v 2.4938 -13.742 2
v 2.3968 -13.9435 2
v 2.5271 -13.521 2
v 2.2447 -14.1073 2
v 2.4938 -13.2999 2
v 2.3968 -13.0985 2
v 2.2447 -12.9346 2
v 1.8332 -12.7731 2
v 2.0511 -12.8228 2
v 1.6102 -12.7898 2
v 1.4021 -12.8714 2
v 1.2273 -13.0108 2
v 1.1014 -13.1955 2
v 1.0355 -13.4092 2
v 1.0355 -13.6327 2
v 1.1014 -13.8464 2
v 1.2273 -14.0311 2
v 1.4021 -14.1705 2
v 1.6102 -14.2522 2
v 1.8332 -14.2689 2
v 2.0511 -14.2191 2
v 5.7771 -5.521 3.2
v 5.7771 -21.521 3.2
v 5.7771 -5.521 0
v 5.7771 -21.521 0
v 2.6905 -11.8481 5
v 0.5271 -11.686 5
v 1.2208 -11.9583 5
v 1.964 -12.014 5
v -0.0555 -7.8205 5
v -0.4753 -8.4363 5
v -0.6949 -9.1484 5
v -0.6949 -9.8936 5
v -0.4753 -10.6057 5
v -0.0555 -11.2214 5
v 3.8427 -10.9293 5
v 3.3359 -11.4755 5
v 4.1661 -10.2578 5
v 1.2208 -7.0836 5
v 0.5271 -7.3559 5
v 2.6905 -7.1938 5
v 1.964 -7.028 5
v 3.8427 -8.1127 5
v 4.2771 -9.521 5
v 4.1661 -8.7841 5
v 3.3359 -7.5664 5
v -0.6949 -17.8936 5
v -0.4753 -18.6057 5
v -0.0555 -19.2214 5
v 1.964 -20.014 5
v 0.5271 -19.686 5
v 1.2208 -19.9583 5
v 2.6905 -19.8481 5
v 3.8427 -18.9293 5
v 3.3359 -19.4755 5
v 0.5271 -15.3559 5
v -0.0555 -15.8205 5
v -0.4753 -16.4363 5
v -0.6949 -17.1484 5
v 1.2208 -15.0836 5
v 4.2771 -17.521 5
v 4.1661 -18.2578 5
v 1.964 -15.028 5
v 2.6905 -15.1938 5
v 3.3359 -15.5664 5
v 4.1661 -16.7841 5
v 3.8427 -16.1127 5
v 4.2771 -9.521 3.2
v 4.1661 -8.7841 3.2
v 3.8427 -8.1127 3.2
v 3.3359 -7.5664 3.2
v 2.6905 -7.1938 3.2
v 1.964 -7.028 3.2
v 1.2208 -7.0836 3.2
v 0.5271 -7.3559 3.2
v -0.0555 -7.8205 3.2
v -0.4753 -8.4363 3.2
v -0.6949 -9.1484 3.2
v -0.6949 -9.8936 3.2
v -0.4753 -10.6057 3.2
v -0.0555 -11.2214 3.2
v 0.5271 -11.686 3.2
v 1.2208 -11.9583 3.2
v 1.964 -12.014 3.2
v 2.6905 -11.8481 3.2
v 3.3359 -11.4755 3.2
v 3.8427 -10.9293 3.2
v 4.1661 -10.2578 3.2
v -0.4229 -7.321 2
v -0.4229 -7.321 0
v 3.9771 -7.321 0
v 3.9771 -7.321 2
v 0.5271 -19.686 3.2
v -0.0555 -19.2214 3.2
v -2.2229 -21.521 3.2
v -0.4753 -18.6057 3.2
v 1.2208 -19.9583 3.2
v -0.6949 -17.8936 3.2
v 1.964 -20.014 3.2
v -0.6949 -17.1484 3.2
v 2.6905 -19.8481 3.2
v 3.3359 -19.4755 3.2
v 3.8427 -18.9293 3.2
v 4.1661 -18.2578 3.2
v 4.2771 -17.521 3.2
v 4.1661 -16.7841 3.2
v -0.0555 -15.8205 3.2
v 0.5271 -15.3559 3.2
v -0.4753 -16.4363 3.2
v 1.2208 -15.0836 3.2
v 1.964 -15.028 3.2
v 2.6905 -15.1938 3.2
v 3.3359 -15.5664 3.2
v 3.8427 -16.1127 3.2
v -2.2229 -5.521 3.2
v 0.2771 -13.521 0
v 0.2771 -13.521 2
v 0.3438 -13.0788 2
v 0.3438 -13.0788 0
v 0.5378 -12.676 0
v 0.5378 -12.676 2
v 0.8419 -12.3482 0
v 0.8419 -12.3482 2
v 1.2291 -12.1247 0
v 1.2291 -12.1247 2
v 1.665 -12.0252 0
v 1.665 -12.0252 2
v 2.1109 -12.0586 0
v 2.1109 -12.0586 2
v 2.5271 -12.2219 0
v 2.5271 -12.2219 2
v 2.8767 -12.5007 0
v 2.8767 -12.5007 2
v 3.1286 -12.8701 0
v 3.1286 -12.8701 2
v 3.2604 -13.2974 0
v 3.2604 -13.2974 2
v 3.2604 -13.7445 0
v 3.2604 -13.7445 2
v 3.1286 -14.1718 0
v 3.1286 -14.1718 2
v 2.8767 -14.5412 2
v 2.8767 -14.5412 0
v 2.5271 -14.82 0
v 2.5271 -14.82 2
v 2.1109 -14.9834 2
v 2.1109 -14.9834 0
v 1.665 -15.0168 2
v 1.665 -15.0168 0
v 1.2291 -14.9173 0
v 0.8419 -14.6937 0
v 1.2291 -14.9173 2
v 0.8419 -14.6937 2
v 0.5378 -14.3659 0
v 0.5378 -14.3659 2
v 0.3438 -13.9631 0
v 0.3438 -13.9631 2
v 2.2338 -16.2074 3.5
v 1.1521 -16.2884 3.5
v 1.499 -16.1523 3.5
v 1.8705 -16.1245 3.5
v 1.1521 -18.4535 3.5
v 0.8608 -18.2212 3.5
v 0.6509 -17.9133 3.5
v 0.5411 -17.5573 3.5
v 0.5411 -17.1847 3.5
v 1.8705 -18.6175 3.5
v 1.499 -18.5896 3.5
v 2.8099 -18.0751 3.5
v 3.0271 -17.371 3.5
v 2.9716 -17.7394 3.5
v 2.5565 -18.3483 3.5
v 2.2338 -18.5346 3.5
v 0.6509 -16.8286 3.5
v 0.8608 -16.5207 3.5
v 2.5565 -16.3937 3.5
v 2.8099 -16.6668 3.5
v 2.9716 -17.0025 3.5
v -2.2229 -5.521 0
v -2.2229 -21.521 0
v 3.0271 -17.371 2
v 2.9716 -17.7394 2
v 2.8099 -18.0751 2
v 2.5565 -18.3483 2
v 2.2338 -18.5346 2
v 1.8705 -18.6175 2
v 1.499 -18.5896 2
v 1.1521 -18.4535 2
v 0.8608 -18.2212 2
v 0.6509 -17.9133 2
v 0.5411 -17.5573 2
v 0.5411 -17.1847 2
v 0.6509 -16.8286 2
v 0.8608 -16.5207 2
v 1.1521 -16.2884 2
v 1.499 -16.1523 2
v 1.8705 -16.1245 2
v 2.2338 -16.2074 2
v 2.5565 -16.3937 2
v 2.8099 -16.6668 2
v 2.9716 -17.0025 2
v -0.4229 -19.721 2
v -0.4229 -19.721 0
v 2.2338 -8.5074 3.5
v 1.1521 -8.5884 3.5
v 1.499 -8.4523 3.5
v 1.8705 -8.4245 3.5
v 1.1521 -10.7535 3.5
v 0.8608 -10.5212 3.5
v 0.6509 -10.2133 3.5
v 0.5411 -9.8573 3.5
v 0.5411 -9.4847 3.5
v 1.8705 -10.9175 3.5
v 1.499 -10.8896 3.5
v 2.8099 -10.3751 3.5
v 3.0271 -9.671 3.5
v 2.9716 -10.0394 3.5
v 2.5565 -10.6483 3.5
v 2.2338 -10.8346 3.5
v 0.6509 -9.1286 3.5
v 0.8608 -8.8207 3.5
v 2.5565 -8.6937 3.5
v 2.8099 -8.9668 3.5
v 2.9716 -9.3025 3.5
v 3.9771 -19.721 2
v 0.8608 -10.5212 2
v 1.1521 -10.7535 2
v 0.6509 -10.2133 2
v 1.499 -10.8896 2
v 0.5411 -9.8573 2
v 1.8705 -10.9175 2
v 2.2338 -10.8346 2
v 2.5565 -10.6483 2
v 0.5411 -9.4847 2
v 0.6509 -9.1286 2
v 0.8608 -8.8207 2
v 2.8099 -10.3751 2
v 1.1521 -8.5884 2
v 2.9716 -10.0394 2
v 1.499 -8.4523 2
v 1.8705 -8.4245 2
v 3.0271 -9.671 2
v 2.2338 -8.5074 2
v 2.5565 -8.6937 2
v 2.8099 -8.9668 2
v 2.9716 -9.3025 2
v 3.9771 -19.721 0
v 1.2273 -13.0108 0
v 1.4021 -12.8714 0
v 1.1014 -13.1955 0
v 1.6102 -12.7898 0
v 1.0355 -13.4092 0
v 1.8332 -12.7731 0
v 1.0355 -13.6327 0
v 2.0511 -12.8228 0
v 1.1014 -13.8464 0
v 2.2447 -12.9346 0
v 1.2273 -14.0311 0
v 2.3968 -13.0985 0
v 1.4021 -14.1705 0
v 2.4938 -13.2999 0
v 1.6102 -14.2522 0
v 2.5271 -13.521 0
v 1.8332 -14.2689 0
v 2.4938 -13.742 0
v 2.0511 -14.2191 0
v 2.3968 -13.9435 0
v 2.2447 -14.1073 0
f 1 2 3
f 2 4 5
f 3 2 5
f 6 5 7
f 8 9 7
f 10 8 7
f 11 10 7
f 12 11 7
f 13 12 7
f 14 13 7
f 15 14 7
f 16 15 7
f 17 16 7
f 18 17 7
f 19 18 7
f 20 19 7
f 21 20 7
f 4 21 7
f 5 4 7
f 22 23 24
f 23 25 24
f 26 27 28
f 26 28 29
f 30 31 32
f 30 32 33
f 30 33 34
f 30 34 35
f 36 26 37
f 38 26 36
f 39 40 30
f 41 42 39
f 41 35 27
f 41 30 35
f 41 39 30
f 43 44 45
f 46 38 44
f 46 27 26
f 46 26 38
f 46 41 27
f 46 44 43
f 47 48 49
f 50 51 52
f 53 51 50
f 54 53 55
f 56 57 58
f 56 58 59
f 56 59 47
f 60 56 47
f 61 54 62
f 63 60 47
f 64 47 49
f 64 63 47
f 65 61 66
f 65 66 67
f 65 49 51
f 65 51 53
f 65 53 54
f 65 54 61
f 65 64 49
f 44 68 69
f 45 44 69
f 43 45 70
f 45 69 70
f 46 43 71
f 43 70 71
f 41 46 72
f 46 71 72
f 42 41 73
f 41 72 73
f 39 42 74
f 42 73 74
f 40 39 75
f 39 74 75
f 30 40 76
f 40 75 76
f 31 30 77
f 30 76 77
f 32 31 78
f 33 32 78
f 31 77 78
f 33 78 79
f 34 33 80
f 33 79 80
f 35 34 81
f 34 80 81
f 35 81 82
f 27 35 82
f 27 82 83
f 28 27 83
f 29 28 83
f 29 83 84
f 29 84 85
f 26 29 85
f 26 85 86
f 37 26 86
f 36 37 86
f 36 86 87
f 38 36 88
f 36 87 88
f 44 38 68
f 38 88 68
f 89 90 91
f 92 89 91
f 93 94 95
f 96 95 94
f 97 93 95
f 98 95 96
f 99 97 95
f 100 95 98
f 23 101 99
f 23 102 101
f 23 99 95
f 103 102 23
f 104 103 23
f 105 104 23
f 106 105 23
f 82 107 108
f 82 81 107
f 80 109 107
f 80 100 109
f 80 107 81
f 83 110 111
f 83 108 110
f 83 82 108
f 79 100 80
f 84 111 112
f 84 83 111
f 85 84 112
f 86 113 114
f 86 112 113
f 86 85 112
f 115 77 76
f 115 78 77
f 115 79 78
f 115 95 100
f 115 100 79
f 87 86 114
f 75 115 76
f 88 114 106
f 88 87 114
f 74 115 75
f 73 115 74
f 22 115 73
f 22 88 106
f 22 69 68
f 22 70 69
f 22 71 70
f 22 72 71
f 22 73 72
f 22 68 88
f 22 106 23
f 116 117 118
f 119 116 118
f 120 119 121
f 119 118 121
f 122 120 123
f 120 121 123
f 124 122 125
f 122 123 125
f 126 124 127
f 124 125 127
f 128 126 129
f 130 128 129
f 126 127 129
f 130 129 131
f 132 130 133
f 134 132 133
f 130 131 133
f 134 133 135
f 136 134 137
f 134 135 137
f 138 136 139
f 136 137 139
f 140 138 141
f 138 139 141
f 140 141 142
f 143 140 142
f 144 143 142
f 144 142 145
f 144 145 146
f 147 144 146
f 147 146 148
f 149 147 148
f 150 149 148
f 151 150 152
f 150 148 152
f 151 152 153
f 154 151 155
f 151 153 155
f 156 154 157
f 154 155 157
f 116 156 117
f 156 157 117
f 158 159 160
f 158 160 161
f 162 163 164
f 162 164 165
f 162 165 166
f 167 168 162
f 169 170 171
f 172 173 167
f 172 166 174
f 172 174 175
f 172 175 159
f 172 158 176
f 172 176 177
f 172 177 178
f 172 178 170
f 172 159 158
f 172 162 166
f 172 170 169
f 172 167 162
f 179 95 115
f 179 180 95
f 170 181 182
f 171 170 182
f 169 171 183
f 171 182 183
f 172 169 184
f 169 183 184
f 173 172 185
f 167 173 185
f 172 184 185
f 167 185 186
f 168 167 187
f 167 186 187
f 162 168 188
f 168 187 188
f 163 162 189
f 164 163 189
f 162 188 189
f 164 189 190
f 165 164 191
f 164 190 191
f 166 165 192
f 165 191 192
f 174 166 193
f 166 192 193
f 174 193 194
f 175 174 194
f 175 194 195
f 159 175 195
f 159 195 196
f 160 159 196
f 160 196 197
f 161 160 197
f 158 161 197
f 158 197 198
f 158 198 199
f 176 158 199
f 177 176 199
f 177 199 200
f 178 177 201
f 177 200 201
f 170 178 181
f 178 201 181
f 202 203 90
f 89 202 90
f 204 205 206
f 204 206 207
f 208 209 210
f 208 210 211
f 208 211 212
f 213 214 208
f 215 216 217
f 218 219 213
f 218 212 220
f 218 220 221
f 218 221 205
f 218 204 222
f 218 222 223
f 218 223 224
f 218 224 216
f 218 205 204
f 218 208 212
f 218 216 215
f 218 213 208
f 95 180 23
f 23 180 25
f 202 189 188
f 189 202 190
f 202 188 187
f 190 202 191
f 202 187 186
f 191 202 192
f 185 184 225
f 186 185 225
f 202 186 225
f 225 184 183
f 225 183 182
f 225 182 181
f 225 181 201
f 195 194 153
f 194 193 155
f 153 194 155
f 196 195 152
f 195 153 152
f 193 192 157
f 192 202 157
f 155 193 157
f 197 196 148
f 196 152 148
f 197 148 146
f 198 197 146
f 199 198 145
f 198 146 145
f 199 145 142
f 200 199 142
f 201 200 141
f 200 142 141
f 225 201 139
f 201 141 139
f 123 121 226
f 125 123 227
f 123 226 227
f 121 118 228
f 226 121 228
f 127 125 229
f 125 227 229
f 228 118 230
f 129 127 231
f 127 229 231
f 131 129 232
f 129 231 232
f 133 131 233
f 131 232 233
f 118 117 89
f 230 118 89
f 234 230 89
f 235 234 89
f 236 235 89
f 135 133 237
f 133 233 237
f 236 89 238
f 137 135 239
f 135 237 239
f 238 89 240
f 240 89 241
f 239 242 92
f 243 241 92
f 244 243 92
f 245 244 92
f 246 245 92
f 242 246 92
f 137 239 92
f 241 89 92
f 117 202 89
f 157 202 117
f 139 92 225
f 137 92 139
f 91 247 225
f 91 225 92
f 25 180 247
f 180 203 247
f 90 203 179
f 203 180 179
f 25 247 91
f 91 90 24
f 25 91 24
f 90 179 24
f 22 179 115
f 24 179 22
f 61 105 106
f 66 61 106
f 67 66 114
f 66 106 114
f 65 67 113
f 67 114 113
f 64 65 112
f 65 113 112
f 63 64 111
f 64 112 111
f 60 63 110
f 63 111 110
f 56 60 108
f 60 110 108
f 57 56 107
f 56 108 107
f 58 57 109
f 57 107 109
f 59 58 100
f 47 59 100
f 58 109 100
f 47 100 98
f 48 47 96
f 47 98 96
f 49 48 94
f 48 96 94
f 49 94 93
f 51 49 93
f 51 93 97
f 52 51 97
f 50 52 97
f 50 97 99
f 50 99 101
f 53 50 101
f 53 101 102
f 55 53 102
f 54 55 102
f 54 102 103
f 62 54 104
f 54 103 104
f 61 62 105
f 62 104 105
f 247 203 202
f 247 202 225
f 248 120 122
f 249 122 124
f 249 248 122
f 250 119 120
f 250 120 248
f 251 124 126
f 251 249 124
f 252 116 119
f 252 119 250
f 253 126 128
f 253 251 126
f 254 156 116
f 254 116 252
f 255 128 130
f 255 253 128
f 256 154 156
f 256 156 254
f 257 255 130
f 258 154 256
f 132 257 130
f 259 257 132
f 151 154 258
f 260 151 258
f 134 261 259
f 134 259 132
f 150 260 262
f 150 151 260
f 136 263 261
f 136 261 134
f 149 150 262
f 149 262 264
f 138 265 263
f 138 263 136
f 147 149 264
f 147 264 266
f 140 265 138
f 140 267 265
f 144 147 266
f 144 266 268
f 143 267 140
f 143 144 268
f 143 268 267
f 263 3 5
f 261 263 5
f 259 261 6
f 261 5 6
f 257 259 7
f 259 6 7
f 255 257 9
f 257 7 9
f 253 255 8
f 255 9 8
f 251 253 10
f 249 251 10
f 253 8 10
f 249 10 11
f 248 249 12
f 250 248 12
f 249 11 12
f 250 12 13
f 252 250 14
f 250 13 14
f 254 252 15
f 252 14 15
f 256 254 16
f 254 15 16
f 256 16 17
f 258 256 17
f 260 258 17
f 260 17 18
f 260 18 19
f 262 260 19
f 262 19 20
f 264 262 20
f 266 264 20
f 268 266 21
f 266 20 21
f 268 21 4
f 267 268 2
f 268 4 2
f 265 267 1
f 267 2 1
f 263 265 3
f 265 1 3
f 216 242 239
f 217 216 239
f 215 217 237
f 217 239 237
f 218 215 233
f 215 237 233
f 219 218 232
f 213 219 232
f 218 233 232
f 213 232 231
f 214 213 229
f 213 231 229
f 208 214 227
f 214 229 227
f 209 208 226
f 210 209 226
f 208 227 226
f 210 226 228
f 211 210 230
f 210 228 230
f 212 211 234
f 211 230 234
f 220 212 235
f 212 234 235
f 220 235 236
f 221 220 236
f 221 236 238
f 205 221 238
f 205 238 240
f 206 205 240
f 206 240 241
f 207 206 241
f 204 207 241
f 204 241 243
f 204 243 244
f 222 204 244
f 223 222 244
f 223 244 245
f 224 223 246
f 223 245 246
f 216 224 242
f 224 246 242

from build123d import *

# Parameters (mm, degrees)
F0_W     = 8
F0_H     = 16
F0_W_2   = 4.4
F0_H_2   = 12.4
F1_DEPTH = 2
F2_W     = 8
F2_H     = 16
F3_DEPTH = 1.2
F4_R     = 2.5
F5_DEPTH = 1.8
F7_DEPTH = 2
F8_R     = 1.25
F9_DEPTH = 1.5


with BuildPart() as f1:
    # F0 (on Top) → F1 (new body)
    with BuildSketch(Plane.XY):
        with Locations((1.777131, -13.520962)):
            Rectangle(F0_W, F0_H)
        with Locations((1.777131, -13.520962)):
            Rectangle(F0_W_2, F0_H_2, mode=Mode.SUBTRACT)
    extrude(amount=F1_DEPTH)

    # F2 (on face) → F3 (join)
    with BuildSketch(Plane.XY.offset(2)):
        with Locations((1.777131, -13.520962)):
            Rectangle(F2_W, F2_H)
    extrude(amount=F3_DEPTH)

    # F4 (on face) → F5 (join)
    with BuildSketch(Plane.XY.offset(3.2)):
        with Locations((1.777131, -9.520962)):
            Circle(F4_R)
        with Locations((1.777131, -17.520962)):
            Circle(F4_R)
    extrude(amount=F5_DEPTH)

    # F6 (on face) → F7 (join)
    with BuildSketch(Plane(origin=(0, 0, 2), x_dir=(1, 0, 0), z_dir=(0, 0, -1))):
        with BuildLine():
            ThreePointArc((1.027131, 13.520962), (1.777131, 14.270962), (2.527131, 13.520962))
            Line((2.527131, 13.520962), (3.277131, 13.520962))
            ThreePointArc((3.277131, 13.520962), (1.777131, 15.020962), (0.277131, 13.520962))
            Line((0.277131, 13.520962), (1.027131, 13.520962))
        make_face()
        with BuildLine():
            Line((3.277131, 13.520962), (2.527131, 13.520962))
            ThreePointArc((2.527131, 13.520962), (1.777131, 12.770962), (1.027131, 13.520962))
            Line((1.027131, 13.520962), (0.277131, 13.520962))
            ThreePointArc((0.277131, 13.520962), (1.777131, 12.020962), (3.277131, 13.520962))
        make_face()
    extrude(amount=F7_DEPTH)

    # F8 (on face) → F9 (cut)
    with BuildSketch(Plane(origin=(0, 0, 2), x_dir=(1, 0, 0), z_dir=(0, 0, -1))):
        with Locations((1.777131, 17.370962)):
            Circle(F8_R)
        with Locations((1.777131, 9.670962)):
            Circle(F8_R)
    extrude(amount=-F9_DEPTH, mode=Mode.SUBTRACT)


solid = f1.part
